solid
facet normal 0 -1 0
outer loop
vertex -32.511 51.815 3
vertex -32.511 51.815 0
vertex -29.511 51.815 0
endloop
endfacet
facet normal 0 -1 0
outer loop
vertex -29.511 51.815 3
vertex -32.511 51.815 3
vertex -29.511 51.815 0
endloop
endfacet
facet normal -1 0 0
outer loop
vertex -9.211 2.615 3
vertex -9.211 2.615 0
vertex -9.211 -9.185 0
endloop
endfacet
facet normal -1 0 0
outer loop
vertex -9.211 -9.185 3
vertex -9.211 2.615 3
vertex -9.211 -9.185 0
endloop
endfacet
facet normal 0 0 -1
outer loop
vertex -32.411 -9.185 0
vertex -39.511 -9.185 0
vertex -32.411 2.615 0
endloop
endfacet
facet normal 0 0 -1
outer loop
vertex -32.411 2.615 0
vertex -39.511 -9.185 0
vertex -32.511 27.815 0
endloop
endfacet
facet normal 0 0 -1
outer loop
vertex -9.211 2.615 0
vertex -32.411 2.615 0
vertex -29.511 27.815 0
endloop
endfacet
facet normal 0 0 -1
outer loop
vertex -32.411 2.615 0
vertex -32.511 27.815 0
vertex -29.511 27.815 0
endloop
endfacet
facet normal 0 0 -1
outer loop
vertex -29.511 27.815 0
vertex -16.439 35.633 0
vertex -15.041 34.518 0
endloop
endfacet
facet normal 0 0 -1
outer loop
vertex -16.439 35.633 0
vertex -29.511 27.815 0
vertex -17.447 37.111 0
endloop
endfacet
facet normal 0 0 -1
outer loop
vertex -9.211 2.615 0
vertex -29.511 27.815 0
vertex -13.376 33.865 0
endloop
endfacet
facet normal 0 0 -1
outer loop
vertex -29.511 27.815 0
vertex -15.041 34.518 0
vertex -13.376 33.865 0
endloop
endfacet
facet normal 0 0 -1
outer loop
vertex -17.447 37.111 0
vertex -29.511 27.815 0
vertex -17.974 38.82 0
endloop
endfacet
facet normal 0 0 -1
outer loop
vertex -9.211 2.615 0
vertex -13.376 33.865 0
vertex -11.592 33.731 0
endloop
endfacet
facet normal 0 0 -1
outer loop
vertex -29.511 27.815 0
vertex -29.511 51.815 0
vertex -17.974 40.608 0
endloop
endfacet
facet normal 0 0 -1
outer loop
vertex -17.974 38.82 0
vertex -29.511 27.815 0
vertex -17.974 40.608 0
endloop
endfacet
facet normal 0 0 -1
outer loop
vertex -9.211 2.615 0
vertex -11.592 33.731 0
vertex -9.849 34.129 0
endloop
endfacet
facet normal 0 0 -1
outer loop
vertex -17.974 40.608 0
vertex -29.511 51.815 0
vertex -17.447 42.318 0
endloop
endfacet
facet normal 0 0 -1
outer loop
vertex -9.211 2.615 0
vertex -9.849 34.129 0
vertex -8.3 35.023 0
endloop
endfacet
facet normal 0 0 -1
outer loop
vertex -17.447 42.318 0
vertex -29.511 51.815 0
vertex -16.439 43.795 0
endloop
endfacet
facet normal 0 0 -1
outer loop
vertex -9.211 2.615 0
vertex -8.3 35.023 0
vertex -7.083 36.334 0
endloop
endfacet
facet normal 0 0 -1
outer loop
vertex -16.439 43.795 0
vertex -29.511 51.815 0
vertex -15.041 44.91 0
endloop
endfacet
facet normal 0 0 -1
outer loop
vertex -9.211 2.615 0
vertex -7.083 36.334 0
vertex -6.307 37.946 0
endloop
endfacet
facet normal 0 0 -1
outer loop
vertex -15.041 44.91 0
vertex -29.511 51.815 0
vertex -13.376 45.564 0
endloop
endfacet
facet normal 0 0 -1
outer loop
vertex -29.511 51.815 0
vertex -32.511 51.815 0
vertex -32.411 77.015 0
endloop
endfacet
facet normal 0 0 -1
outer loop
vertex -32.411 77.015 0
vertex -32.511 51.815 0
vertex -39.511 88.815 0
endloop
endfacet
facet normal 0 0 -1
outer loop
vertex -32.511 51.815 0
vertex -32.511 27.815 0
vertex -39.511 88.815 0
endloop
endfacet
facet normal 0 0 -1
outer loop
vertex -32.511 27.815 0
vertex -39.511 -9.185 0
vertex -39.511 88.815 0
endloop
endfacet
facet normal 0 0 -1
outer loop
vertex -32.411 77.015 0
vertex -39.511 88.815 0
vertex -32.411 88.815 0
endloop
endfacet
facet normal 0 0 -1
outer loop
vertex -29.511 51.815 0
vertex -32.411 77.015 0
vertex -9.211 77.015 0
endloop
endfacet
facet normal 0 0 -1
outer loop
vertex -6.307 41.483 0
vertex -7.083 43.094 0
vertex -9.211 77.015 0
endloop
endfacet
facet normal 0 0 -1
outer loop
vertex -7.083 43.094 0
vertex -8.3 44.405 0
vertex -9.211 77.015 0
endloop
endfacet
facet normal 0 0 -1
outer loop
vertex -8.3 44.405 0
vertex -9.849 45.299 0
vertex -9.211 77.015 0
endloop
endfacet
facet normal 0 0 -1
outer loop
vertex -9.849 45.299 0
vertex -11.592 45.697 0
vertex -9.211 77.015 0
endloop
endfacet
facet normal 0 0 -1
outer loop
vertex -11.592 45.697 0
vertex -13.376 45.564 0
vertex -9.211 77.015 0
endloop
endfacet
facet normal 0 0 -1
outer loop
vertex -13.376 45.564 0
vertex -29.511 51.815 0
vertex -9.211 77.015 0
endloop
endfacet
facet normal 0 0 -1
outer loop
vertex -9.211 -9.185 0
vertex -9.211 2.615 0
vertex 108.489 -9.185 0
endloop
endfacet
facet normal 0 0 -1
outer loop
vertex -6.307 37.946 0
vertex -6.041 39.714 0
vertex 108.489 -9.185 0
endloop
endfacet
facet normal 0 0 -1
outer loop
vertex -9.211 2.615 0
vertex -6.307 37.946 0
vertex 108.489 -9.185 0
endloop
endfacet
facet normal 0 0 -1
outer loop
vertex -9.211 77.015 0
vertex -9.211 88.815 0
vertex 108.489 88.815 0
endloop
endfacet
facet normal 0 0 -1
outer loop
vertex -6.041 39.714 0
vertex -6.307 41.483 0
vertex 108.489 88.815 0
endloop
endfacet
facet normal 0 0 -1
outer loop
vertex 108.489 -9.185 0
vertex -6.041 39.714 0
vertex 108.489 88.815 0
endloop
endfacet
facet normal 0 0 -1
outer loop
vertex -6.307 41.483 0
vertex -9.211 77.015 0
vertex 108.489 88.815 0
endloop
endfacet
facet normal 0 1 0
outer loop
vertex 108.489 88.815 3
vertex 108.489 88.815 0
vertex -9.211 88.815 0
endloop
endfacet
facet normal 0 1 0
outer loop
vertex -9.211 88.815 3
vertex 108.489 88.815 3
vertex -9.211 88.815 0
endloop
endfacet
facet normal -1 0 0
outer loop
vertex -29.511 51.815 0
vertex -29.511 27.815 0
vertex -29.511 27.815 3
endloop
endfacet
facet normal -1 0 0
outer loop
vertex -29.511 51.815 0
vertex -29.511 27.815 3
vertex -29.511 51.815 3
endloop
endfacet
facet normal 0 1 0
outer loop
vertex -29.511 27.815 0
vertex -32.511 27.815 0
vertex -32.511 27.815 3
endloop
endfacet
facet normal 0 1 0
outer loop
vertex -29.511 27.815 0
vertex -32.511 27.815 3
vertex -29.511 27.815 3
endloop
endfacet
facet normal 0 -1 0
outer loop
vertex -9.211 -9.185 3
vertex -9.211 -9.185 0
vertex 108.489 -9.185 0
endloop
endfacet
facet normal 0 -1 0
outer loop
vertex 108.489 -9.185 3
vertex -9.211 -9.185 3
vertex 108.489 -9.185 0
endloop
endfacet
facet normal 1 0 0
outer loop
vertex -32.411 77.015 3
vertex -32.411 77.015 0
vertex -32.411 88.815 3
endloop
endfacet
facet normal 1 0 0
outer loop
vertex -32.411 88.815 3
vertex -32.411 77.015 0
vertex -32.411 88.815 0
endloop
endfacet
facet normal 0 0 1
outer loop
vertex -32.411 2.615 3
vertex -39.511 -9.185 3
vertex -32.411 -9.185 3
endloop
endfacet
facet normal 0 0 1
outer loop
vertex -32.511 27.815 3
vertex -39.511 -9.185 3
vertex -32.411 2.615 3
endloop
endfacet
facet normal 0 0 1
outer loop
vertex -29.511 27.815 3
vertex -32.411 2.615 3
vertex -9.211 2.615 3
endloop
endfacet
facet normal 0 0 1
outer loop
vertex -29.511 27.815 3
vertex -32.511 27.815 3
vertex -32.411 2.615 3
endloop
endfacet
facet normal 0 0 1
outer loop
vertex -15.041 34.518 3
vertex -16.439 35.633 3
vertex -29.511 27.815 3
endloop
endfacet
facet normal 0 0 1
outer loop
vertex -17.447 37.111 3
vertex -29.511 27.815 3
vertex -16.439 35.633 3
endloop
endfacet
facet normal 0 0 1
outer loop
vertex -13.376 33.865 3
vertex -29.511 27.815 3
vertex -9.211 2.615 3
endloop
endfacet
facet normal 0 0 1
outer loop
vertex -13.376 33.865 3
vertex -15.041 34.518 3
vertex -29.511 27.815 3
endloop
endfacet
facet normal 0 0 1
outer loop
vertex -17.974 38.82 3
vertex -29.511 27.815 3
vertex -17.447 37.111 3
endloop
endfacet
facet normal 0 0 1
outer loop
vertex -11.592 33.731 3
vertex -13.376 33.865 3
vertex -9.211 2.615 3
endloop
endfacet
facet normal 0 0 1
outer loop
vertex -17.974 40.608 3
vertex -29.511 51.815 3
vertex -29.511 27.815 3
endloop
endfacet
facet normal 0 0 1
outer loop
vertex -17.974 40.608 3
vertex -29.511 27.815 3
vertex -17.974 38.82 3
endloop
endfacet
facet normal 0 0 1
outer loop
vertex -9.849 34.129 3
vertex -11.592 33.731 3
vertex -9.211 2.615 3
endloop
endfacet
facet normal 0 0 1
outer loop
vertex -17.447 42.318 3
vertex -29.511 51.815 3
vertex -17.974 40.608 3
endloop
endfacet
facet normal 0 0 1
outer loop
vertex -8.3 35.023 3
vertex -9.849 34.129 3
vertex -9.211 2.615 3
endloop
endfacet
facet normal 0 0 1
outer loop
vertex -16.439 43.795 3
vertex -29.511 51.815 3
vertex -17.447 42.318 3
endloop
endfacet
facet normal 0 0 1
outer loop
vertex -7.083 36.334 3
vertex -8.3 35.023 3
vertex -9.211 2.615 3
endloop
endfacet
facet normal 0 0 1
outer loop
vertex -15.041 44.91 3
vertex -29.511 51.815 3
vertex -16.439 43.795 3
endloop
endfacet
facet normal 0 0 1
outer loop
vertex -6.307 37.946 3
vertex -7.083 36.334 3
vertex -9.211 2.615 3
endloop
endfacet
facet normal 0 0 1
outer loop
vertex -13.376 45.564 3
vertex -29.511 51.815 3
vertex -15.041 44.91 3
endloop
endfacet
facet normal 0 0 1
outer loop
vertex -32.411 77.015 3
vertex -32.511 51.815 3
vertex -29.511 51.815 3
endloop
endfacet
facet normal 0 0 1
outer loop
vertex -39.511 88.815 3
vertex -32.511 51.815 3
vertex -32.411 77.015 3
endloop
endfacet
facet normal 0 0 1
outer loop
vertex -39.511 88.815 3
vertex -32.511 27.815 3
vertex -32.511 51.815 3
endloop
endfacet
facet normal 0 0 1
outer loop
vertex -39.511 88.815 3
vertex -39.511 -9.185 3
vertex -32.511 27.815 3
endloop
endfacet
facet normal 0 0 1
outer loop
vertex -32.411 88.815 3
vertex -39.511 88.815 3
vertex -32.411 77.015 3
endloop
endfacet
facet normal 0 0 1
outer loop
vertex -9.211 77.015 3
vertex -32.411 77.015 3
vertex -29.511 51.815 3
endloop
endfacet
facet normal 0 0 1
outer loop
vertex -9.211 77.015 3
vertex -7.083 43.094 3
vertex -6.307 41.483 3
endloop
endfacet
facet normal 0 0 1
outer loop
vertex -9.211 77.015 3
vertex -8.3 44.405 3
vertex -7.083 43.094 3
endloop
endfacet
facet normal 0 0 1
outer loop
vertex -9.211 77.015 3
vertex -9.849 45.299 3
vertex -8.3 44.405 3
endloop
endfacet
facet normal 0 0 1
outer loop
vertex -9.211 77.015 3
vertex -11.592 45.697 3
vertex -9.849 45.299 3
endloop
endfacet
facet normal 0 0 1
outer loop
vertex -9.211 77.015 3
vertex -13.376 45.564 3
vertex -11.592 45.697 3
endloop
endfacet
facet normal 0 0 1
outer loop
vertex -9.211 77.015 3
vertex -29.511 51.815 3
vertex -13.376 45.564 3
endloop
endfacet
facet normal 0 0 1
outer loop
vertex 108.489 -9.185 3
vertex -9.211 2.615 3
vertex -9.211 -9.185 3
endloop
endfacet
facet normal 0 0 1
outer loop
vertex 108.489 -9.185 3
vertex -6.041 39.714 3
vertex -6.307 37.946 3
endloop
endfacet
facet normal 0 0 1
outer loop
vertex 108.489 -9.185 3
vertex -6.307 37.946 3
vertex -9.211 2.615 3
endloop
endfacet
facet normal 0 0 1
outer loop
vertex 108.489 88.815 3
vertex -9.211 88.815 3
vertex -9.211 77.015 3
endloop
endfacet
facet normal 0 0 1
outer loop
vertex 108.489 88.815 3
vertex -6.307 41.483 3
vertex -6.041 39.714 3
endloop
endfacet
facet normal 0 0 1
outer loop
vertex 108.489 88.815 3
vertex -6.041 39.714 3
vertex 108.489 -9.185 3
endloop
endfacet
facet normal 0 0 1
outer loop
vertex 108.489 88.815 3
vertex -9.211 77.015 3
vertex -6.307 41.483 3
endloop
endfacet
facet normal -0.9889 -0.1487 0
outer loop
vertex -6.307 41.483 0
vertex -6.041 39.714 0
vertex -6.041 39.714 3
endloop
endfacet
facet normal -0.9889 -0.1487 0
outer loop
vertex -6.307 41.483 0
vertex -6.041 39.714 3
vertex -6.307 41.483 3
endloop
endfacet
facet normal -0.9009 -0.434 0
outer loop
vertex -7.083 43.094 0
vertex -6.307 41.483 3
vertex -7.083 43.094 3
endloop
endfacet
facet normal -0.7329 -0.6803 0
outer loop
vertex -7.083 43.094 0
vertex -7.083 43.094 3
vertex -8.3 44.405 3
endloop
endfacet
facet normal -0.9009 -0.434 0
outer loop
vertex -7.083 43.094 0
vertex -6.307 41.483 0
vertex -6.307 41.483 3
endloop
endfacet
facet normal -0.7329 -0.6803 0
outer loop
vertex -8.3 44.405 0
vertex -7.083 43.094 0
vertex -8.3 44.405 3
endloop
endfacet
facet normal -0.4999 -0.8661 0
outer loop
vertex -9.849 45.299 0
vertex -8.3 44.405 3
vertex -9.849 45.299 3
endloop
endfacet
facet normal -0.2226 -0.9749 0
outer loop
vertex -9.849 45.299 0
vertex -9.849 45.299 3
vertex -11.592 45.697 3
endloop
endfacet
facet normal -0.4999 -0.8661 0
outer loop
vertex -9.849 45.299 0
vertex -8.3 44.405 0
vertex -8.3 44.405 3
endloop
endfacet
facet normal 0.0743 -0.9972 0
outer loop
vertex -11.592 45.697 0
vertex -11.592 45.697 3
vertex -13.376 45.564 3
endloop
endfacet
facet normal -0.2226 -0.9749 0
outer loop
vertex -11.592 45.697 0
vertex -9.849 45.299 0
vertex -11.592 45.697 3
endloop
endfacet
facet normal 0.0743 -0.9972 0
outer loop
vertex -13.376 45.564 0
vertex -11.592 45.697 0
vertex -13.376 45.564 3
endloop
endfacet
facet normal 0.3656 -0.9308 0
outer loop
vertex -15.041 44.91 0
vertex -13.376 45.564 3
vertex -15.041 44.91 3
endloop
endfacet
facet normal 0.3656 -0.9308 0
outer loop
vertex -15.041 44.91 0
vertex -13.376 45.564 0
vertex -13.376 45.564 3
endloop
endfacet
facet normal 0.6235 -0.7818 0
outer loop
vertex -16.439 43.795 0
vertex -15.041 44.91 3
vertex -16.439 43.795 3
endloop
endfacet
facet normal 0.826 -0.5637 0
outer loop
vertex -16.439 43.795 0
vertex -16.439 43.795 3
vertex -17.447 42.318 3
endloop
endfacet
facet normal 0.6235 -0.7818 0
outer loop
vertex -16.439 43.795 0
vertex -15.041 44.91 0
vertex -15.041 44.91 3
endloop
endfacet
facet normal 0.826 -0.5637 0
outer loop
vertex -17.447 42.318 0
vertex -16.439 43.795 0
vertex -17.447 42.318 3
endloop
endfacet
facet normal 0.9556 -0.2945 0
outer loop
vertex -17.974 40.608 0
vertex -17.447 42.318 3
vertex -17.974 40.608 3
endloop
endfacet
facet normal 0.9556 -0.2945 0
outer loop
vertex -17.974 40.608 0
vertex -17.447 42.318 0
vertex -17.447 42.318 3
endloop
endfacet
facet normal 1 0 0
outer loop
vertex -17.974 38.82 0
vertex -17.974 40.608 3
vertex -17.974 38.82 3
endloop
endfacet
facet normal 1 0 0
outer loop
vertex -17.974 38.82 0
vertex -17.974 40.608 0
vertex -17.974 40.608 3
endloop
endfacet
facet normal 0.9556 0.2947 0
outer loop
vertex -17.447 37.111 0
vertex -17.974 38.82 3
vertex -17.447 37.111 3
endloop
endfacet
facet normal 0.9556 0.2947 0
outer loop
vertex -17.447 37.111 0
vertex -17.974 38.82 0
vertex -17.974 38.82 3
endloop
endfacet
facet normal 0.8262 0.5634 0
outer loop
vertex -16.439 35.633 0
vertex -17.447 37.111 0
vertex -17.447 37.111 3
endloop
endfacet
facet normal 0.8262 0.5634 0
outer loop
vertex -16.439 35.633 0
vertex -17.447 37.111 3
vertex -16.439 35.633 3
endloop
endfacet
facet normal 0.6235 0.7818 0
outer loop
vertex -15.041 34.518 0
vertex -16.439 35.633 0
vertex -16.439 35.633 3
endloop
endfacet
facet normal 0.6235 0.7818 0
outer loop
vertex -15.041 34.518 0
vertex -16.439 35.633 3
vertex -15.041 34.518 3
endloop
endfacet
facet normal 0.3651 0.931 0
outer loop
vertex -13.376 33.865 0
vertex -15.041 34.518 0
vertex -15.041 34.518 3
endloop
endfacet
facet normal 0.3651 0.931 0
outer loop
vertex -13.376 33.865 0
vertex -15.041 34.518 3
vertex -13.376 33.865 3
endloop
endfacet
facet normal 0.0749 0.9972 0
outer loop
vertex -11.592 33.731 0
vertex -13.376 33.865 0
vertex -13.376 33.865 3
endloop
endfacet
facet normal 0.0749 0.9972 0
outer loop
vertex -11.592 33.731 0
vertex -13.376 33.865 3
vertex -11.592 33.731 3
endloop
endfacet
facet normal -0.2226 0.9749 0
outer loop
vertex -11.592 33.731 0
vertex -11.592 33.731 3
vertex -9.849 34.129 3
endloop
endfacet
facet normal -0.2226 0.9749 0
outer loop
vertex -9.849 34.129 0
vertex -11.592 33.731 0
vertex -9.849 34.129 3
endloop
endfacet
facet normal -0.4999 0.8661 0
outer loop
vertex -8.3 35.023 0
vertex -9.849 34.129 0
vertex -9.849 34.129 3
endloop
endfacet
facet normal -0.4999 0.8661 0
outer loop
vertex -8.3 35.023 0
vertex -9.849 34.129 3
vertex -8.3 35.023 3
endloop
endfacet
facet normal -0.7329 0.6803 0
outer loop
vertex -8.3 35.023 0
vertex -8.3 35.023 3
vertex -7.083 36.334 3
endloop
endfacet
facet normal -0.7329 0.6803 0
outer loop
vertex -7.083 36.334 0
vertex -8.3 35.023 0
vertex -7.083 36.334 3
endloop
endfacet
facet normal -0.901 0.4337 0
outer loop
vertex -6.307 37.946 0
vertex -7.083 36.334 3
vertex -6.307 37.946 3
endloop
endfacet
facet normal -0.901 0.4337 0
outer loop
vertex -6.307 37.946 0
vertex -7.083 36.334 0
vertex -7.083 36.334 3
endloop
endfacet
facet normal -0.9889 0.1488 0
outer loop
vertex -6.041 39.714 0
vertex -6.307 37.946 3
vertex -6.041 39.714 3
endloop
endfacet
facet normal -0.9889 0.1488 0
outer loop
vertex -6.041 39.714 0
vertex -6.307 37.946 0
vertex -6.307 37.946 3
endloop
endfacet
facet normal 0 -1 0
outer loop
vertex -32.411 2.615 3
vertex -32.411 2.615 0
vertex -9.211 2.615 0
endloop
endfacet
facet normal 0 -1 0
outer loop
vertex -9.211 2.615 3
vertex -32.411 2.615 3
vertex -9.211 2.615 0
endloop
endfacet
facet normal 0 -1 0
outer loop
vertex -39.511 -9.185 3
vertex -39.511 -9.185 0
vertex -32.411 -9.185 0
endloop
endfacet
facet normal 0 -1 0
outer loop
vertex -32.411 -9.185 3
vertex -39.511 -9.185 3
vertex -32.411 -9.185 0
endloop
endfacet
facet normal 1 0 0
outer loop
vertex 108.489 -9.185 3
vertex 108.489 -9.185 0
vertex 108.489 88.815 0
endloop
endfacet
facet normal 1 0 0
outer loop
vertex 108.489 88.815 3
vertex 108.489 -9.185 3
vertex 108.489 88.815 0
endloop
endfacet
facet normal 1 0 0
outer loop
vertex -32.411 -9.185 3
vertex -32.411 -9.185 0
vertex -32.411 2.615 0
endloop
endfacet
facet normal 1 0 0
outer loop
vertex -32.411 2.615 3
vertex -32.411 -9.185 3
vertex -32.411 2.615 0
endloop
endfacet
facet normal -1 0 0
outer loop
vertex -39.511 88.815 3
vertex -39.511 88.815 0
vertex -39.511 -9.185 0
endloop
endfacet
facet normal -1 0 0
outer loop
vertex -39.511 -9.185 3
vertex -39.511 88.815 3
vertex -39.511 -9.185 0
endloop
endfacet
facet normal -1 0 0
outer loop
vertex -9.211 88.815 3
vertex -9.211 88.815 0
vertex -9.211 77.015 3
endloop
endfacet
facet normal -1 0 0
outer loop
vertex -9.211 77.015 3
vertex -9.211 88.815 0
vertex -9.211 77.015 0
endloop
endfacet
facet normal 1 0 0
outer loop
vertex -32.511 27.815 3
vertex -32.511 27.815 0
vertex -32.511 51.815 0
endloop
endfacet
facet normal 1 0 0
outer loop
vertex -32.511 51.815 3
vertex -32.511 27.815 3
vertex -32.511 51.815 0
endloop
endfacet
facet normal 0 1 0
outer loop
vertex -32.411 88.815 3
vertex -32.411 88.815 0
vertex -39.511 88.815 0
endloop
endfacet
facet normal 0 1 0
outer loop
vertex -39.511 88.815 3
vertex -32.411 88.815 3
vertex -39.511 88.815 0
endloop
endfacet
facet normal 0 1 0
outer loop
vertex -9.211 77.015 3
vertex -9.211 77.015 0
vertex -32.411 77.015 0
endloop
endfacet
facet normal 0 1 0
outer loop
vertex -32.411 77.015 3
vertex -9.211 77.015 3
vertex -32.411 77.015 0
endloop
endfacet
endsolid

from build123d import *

# Parameters (mm, degrees)
MODEL_R                 = 6
MODEL_W                 = 3
MODEL_H                 = 24
SALIENTE_EXTRUIR2_DEPTH = 3


with BuildPart() as part:
    # Model → Saliente-Extruir2 (new body)
    with BuildSketch(Plane.XY):
        Polygon((-39.51128192, -9.185059482), (-32.41128192, -9.185059482), (-32.41128192, 2.614940518), (-9.21128192, 2.614940518), (-9.21128192, -9.185059482), (16.002025332, -9.185059482), (50.517196398, -9.185059482), (78.48871808, -9.185059482), (89.48871808, -9.185059482), (96.48871808, -9.185059482), (103.48871808, -9.185059482), (108.48871808, -9.185059482), (108.48871808, 88.814940518), (24.48871808, 88.814940518), (2.28871808, 88.814940518), (-0.51128192, 88.814940518), (-1.51128192, 88.814940518), (-9.21128192, 88.814940518), (-9.21128192, 77.014940518), (-32.41128192, 77.014940518), (-32.41128192, 88.814940518), (-39.51128192, 88.814940518), align=None)
        with Locations((-12.040844912, 39.714244751)):
            Circle(MODEL_R, mode=Mode.SUBTRACT)
        with Locations((-31.01128192, 39.814940518)):
            Rectangle(MODEL_W, MODEL_H, mode=Mode.SUBTRACT)
    extrude(amount=SALIENTE_EXTRUIR2_DEPTH)


solid = part.part
